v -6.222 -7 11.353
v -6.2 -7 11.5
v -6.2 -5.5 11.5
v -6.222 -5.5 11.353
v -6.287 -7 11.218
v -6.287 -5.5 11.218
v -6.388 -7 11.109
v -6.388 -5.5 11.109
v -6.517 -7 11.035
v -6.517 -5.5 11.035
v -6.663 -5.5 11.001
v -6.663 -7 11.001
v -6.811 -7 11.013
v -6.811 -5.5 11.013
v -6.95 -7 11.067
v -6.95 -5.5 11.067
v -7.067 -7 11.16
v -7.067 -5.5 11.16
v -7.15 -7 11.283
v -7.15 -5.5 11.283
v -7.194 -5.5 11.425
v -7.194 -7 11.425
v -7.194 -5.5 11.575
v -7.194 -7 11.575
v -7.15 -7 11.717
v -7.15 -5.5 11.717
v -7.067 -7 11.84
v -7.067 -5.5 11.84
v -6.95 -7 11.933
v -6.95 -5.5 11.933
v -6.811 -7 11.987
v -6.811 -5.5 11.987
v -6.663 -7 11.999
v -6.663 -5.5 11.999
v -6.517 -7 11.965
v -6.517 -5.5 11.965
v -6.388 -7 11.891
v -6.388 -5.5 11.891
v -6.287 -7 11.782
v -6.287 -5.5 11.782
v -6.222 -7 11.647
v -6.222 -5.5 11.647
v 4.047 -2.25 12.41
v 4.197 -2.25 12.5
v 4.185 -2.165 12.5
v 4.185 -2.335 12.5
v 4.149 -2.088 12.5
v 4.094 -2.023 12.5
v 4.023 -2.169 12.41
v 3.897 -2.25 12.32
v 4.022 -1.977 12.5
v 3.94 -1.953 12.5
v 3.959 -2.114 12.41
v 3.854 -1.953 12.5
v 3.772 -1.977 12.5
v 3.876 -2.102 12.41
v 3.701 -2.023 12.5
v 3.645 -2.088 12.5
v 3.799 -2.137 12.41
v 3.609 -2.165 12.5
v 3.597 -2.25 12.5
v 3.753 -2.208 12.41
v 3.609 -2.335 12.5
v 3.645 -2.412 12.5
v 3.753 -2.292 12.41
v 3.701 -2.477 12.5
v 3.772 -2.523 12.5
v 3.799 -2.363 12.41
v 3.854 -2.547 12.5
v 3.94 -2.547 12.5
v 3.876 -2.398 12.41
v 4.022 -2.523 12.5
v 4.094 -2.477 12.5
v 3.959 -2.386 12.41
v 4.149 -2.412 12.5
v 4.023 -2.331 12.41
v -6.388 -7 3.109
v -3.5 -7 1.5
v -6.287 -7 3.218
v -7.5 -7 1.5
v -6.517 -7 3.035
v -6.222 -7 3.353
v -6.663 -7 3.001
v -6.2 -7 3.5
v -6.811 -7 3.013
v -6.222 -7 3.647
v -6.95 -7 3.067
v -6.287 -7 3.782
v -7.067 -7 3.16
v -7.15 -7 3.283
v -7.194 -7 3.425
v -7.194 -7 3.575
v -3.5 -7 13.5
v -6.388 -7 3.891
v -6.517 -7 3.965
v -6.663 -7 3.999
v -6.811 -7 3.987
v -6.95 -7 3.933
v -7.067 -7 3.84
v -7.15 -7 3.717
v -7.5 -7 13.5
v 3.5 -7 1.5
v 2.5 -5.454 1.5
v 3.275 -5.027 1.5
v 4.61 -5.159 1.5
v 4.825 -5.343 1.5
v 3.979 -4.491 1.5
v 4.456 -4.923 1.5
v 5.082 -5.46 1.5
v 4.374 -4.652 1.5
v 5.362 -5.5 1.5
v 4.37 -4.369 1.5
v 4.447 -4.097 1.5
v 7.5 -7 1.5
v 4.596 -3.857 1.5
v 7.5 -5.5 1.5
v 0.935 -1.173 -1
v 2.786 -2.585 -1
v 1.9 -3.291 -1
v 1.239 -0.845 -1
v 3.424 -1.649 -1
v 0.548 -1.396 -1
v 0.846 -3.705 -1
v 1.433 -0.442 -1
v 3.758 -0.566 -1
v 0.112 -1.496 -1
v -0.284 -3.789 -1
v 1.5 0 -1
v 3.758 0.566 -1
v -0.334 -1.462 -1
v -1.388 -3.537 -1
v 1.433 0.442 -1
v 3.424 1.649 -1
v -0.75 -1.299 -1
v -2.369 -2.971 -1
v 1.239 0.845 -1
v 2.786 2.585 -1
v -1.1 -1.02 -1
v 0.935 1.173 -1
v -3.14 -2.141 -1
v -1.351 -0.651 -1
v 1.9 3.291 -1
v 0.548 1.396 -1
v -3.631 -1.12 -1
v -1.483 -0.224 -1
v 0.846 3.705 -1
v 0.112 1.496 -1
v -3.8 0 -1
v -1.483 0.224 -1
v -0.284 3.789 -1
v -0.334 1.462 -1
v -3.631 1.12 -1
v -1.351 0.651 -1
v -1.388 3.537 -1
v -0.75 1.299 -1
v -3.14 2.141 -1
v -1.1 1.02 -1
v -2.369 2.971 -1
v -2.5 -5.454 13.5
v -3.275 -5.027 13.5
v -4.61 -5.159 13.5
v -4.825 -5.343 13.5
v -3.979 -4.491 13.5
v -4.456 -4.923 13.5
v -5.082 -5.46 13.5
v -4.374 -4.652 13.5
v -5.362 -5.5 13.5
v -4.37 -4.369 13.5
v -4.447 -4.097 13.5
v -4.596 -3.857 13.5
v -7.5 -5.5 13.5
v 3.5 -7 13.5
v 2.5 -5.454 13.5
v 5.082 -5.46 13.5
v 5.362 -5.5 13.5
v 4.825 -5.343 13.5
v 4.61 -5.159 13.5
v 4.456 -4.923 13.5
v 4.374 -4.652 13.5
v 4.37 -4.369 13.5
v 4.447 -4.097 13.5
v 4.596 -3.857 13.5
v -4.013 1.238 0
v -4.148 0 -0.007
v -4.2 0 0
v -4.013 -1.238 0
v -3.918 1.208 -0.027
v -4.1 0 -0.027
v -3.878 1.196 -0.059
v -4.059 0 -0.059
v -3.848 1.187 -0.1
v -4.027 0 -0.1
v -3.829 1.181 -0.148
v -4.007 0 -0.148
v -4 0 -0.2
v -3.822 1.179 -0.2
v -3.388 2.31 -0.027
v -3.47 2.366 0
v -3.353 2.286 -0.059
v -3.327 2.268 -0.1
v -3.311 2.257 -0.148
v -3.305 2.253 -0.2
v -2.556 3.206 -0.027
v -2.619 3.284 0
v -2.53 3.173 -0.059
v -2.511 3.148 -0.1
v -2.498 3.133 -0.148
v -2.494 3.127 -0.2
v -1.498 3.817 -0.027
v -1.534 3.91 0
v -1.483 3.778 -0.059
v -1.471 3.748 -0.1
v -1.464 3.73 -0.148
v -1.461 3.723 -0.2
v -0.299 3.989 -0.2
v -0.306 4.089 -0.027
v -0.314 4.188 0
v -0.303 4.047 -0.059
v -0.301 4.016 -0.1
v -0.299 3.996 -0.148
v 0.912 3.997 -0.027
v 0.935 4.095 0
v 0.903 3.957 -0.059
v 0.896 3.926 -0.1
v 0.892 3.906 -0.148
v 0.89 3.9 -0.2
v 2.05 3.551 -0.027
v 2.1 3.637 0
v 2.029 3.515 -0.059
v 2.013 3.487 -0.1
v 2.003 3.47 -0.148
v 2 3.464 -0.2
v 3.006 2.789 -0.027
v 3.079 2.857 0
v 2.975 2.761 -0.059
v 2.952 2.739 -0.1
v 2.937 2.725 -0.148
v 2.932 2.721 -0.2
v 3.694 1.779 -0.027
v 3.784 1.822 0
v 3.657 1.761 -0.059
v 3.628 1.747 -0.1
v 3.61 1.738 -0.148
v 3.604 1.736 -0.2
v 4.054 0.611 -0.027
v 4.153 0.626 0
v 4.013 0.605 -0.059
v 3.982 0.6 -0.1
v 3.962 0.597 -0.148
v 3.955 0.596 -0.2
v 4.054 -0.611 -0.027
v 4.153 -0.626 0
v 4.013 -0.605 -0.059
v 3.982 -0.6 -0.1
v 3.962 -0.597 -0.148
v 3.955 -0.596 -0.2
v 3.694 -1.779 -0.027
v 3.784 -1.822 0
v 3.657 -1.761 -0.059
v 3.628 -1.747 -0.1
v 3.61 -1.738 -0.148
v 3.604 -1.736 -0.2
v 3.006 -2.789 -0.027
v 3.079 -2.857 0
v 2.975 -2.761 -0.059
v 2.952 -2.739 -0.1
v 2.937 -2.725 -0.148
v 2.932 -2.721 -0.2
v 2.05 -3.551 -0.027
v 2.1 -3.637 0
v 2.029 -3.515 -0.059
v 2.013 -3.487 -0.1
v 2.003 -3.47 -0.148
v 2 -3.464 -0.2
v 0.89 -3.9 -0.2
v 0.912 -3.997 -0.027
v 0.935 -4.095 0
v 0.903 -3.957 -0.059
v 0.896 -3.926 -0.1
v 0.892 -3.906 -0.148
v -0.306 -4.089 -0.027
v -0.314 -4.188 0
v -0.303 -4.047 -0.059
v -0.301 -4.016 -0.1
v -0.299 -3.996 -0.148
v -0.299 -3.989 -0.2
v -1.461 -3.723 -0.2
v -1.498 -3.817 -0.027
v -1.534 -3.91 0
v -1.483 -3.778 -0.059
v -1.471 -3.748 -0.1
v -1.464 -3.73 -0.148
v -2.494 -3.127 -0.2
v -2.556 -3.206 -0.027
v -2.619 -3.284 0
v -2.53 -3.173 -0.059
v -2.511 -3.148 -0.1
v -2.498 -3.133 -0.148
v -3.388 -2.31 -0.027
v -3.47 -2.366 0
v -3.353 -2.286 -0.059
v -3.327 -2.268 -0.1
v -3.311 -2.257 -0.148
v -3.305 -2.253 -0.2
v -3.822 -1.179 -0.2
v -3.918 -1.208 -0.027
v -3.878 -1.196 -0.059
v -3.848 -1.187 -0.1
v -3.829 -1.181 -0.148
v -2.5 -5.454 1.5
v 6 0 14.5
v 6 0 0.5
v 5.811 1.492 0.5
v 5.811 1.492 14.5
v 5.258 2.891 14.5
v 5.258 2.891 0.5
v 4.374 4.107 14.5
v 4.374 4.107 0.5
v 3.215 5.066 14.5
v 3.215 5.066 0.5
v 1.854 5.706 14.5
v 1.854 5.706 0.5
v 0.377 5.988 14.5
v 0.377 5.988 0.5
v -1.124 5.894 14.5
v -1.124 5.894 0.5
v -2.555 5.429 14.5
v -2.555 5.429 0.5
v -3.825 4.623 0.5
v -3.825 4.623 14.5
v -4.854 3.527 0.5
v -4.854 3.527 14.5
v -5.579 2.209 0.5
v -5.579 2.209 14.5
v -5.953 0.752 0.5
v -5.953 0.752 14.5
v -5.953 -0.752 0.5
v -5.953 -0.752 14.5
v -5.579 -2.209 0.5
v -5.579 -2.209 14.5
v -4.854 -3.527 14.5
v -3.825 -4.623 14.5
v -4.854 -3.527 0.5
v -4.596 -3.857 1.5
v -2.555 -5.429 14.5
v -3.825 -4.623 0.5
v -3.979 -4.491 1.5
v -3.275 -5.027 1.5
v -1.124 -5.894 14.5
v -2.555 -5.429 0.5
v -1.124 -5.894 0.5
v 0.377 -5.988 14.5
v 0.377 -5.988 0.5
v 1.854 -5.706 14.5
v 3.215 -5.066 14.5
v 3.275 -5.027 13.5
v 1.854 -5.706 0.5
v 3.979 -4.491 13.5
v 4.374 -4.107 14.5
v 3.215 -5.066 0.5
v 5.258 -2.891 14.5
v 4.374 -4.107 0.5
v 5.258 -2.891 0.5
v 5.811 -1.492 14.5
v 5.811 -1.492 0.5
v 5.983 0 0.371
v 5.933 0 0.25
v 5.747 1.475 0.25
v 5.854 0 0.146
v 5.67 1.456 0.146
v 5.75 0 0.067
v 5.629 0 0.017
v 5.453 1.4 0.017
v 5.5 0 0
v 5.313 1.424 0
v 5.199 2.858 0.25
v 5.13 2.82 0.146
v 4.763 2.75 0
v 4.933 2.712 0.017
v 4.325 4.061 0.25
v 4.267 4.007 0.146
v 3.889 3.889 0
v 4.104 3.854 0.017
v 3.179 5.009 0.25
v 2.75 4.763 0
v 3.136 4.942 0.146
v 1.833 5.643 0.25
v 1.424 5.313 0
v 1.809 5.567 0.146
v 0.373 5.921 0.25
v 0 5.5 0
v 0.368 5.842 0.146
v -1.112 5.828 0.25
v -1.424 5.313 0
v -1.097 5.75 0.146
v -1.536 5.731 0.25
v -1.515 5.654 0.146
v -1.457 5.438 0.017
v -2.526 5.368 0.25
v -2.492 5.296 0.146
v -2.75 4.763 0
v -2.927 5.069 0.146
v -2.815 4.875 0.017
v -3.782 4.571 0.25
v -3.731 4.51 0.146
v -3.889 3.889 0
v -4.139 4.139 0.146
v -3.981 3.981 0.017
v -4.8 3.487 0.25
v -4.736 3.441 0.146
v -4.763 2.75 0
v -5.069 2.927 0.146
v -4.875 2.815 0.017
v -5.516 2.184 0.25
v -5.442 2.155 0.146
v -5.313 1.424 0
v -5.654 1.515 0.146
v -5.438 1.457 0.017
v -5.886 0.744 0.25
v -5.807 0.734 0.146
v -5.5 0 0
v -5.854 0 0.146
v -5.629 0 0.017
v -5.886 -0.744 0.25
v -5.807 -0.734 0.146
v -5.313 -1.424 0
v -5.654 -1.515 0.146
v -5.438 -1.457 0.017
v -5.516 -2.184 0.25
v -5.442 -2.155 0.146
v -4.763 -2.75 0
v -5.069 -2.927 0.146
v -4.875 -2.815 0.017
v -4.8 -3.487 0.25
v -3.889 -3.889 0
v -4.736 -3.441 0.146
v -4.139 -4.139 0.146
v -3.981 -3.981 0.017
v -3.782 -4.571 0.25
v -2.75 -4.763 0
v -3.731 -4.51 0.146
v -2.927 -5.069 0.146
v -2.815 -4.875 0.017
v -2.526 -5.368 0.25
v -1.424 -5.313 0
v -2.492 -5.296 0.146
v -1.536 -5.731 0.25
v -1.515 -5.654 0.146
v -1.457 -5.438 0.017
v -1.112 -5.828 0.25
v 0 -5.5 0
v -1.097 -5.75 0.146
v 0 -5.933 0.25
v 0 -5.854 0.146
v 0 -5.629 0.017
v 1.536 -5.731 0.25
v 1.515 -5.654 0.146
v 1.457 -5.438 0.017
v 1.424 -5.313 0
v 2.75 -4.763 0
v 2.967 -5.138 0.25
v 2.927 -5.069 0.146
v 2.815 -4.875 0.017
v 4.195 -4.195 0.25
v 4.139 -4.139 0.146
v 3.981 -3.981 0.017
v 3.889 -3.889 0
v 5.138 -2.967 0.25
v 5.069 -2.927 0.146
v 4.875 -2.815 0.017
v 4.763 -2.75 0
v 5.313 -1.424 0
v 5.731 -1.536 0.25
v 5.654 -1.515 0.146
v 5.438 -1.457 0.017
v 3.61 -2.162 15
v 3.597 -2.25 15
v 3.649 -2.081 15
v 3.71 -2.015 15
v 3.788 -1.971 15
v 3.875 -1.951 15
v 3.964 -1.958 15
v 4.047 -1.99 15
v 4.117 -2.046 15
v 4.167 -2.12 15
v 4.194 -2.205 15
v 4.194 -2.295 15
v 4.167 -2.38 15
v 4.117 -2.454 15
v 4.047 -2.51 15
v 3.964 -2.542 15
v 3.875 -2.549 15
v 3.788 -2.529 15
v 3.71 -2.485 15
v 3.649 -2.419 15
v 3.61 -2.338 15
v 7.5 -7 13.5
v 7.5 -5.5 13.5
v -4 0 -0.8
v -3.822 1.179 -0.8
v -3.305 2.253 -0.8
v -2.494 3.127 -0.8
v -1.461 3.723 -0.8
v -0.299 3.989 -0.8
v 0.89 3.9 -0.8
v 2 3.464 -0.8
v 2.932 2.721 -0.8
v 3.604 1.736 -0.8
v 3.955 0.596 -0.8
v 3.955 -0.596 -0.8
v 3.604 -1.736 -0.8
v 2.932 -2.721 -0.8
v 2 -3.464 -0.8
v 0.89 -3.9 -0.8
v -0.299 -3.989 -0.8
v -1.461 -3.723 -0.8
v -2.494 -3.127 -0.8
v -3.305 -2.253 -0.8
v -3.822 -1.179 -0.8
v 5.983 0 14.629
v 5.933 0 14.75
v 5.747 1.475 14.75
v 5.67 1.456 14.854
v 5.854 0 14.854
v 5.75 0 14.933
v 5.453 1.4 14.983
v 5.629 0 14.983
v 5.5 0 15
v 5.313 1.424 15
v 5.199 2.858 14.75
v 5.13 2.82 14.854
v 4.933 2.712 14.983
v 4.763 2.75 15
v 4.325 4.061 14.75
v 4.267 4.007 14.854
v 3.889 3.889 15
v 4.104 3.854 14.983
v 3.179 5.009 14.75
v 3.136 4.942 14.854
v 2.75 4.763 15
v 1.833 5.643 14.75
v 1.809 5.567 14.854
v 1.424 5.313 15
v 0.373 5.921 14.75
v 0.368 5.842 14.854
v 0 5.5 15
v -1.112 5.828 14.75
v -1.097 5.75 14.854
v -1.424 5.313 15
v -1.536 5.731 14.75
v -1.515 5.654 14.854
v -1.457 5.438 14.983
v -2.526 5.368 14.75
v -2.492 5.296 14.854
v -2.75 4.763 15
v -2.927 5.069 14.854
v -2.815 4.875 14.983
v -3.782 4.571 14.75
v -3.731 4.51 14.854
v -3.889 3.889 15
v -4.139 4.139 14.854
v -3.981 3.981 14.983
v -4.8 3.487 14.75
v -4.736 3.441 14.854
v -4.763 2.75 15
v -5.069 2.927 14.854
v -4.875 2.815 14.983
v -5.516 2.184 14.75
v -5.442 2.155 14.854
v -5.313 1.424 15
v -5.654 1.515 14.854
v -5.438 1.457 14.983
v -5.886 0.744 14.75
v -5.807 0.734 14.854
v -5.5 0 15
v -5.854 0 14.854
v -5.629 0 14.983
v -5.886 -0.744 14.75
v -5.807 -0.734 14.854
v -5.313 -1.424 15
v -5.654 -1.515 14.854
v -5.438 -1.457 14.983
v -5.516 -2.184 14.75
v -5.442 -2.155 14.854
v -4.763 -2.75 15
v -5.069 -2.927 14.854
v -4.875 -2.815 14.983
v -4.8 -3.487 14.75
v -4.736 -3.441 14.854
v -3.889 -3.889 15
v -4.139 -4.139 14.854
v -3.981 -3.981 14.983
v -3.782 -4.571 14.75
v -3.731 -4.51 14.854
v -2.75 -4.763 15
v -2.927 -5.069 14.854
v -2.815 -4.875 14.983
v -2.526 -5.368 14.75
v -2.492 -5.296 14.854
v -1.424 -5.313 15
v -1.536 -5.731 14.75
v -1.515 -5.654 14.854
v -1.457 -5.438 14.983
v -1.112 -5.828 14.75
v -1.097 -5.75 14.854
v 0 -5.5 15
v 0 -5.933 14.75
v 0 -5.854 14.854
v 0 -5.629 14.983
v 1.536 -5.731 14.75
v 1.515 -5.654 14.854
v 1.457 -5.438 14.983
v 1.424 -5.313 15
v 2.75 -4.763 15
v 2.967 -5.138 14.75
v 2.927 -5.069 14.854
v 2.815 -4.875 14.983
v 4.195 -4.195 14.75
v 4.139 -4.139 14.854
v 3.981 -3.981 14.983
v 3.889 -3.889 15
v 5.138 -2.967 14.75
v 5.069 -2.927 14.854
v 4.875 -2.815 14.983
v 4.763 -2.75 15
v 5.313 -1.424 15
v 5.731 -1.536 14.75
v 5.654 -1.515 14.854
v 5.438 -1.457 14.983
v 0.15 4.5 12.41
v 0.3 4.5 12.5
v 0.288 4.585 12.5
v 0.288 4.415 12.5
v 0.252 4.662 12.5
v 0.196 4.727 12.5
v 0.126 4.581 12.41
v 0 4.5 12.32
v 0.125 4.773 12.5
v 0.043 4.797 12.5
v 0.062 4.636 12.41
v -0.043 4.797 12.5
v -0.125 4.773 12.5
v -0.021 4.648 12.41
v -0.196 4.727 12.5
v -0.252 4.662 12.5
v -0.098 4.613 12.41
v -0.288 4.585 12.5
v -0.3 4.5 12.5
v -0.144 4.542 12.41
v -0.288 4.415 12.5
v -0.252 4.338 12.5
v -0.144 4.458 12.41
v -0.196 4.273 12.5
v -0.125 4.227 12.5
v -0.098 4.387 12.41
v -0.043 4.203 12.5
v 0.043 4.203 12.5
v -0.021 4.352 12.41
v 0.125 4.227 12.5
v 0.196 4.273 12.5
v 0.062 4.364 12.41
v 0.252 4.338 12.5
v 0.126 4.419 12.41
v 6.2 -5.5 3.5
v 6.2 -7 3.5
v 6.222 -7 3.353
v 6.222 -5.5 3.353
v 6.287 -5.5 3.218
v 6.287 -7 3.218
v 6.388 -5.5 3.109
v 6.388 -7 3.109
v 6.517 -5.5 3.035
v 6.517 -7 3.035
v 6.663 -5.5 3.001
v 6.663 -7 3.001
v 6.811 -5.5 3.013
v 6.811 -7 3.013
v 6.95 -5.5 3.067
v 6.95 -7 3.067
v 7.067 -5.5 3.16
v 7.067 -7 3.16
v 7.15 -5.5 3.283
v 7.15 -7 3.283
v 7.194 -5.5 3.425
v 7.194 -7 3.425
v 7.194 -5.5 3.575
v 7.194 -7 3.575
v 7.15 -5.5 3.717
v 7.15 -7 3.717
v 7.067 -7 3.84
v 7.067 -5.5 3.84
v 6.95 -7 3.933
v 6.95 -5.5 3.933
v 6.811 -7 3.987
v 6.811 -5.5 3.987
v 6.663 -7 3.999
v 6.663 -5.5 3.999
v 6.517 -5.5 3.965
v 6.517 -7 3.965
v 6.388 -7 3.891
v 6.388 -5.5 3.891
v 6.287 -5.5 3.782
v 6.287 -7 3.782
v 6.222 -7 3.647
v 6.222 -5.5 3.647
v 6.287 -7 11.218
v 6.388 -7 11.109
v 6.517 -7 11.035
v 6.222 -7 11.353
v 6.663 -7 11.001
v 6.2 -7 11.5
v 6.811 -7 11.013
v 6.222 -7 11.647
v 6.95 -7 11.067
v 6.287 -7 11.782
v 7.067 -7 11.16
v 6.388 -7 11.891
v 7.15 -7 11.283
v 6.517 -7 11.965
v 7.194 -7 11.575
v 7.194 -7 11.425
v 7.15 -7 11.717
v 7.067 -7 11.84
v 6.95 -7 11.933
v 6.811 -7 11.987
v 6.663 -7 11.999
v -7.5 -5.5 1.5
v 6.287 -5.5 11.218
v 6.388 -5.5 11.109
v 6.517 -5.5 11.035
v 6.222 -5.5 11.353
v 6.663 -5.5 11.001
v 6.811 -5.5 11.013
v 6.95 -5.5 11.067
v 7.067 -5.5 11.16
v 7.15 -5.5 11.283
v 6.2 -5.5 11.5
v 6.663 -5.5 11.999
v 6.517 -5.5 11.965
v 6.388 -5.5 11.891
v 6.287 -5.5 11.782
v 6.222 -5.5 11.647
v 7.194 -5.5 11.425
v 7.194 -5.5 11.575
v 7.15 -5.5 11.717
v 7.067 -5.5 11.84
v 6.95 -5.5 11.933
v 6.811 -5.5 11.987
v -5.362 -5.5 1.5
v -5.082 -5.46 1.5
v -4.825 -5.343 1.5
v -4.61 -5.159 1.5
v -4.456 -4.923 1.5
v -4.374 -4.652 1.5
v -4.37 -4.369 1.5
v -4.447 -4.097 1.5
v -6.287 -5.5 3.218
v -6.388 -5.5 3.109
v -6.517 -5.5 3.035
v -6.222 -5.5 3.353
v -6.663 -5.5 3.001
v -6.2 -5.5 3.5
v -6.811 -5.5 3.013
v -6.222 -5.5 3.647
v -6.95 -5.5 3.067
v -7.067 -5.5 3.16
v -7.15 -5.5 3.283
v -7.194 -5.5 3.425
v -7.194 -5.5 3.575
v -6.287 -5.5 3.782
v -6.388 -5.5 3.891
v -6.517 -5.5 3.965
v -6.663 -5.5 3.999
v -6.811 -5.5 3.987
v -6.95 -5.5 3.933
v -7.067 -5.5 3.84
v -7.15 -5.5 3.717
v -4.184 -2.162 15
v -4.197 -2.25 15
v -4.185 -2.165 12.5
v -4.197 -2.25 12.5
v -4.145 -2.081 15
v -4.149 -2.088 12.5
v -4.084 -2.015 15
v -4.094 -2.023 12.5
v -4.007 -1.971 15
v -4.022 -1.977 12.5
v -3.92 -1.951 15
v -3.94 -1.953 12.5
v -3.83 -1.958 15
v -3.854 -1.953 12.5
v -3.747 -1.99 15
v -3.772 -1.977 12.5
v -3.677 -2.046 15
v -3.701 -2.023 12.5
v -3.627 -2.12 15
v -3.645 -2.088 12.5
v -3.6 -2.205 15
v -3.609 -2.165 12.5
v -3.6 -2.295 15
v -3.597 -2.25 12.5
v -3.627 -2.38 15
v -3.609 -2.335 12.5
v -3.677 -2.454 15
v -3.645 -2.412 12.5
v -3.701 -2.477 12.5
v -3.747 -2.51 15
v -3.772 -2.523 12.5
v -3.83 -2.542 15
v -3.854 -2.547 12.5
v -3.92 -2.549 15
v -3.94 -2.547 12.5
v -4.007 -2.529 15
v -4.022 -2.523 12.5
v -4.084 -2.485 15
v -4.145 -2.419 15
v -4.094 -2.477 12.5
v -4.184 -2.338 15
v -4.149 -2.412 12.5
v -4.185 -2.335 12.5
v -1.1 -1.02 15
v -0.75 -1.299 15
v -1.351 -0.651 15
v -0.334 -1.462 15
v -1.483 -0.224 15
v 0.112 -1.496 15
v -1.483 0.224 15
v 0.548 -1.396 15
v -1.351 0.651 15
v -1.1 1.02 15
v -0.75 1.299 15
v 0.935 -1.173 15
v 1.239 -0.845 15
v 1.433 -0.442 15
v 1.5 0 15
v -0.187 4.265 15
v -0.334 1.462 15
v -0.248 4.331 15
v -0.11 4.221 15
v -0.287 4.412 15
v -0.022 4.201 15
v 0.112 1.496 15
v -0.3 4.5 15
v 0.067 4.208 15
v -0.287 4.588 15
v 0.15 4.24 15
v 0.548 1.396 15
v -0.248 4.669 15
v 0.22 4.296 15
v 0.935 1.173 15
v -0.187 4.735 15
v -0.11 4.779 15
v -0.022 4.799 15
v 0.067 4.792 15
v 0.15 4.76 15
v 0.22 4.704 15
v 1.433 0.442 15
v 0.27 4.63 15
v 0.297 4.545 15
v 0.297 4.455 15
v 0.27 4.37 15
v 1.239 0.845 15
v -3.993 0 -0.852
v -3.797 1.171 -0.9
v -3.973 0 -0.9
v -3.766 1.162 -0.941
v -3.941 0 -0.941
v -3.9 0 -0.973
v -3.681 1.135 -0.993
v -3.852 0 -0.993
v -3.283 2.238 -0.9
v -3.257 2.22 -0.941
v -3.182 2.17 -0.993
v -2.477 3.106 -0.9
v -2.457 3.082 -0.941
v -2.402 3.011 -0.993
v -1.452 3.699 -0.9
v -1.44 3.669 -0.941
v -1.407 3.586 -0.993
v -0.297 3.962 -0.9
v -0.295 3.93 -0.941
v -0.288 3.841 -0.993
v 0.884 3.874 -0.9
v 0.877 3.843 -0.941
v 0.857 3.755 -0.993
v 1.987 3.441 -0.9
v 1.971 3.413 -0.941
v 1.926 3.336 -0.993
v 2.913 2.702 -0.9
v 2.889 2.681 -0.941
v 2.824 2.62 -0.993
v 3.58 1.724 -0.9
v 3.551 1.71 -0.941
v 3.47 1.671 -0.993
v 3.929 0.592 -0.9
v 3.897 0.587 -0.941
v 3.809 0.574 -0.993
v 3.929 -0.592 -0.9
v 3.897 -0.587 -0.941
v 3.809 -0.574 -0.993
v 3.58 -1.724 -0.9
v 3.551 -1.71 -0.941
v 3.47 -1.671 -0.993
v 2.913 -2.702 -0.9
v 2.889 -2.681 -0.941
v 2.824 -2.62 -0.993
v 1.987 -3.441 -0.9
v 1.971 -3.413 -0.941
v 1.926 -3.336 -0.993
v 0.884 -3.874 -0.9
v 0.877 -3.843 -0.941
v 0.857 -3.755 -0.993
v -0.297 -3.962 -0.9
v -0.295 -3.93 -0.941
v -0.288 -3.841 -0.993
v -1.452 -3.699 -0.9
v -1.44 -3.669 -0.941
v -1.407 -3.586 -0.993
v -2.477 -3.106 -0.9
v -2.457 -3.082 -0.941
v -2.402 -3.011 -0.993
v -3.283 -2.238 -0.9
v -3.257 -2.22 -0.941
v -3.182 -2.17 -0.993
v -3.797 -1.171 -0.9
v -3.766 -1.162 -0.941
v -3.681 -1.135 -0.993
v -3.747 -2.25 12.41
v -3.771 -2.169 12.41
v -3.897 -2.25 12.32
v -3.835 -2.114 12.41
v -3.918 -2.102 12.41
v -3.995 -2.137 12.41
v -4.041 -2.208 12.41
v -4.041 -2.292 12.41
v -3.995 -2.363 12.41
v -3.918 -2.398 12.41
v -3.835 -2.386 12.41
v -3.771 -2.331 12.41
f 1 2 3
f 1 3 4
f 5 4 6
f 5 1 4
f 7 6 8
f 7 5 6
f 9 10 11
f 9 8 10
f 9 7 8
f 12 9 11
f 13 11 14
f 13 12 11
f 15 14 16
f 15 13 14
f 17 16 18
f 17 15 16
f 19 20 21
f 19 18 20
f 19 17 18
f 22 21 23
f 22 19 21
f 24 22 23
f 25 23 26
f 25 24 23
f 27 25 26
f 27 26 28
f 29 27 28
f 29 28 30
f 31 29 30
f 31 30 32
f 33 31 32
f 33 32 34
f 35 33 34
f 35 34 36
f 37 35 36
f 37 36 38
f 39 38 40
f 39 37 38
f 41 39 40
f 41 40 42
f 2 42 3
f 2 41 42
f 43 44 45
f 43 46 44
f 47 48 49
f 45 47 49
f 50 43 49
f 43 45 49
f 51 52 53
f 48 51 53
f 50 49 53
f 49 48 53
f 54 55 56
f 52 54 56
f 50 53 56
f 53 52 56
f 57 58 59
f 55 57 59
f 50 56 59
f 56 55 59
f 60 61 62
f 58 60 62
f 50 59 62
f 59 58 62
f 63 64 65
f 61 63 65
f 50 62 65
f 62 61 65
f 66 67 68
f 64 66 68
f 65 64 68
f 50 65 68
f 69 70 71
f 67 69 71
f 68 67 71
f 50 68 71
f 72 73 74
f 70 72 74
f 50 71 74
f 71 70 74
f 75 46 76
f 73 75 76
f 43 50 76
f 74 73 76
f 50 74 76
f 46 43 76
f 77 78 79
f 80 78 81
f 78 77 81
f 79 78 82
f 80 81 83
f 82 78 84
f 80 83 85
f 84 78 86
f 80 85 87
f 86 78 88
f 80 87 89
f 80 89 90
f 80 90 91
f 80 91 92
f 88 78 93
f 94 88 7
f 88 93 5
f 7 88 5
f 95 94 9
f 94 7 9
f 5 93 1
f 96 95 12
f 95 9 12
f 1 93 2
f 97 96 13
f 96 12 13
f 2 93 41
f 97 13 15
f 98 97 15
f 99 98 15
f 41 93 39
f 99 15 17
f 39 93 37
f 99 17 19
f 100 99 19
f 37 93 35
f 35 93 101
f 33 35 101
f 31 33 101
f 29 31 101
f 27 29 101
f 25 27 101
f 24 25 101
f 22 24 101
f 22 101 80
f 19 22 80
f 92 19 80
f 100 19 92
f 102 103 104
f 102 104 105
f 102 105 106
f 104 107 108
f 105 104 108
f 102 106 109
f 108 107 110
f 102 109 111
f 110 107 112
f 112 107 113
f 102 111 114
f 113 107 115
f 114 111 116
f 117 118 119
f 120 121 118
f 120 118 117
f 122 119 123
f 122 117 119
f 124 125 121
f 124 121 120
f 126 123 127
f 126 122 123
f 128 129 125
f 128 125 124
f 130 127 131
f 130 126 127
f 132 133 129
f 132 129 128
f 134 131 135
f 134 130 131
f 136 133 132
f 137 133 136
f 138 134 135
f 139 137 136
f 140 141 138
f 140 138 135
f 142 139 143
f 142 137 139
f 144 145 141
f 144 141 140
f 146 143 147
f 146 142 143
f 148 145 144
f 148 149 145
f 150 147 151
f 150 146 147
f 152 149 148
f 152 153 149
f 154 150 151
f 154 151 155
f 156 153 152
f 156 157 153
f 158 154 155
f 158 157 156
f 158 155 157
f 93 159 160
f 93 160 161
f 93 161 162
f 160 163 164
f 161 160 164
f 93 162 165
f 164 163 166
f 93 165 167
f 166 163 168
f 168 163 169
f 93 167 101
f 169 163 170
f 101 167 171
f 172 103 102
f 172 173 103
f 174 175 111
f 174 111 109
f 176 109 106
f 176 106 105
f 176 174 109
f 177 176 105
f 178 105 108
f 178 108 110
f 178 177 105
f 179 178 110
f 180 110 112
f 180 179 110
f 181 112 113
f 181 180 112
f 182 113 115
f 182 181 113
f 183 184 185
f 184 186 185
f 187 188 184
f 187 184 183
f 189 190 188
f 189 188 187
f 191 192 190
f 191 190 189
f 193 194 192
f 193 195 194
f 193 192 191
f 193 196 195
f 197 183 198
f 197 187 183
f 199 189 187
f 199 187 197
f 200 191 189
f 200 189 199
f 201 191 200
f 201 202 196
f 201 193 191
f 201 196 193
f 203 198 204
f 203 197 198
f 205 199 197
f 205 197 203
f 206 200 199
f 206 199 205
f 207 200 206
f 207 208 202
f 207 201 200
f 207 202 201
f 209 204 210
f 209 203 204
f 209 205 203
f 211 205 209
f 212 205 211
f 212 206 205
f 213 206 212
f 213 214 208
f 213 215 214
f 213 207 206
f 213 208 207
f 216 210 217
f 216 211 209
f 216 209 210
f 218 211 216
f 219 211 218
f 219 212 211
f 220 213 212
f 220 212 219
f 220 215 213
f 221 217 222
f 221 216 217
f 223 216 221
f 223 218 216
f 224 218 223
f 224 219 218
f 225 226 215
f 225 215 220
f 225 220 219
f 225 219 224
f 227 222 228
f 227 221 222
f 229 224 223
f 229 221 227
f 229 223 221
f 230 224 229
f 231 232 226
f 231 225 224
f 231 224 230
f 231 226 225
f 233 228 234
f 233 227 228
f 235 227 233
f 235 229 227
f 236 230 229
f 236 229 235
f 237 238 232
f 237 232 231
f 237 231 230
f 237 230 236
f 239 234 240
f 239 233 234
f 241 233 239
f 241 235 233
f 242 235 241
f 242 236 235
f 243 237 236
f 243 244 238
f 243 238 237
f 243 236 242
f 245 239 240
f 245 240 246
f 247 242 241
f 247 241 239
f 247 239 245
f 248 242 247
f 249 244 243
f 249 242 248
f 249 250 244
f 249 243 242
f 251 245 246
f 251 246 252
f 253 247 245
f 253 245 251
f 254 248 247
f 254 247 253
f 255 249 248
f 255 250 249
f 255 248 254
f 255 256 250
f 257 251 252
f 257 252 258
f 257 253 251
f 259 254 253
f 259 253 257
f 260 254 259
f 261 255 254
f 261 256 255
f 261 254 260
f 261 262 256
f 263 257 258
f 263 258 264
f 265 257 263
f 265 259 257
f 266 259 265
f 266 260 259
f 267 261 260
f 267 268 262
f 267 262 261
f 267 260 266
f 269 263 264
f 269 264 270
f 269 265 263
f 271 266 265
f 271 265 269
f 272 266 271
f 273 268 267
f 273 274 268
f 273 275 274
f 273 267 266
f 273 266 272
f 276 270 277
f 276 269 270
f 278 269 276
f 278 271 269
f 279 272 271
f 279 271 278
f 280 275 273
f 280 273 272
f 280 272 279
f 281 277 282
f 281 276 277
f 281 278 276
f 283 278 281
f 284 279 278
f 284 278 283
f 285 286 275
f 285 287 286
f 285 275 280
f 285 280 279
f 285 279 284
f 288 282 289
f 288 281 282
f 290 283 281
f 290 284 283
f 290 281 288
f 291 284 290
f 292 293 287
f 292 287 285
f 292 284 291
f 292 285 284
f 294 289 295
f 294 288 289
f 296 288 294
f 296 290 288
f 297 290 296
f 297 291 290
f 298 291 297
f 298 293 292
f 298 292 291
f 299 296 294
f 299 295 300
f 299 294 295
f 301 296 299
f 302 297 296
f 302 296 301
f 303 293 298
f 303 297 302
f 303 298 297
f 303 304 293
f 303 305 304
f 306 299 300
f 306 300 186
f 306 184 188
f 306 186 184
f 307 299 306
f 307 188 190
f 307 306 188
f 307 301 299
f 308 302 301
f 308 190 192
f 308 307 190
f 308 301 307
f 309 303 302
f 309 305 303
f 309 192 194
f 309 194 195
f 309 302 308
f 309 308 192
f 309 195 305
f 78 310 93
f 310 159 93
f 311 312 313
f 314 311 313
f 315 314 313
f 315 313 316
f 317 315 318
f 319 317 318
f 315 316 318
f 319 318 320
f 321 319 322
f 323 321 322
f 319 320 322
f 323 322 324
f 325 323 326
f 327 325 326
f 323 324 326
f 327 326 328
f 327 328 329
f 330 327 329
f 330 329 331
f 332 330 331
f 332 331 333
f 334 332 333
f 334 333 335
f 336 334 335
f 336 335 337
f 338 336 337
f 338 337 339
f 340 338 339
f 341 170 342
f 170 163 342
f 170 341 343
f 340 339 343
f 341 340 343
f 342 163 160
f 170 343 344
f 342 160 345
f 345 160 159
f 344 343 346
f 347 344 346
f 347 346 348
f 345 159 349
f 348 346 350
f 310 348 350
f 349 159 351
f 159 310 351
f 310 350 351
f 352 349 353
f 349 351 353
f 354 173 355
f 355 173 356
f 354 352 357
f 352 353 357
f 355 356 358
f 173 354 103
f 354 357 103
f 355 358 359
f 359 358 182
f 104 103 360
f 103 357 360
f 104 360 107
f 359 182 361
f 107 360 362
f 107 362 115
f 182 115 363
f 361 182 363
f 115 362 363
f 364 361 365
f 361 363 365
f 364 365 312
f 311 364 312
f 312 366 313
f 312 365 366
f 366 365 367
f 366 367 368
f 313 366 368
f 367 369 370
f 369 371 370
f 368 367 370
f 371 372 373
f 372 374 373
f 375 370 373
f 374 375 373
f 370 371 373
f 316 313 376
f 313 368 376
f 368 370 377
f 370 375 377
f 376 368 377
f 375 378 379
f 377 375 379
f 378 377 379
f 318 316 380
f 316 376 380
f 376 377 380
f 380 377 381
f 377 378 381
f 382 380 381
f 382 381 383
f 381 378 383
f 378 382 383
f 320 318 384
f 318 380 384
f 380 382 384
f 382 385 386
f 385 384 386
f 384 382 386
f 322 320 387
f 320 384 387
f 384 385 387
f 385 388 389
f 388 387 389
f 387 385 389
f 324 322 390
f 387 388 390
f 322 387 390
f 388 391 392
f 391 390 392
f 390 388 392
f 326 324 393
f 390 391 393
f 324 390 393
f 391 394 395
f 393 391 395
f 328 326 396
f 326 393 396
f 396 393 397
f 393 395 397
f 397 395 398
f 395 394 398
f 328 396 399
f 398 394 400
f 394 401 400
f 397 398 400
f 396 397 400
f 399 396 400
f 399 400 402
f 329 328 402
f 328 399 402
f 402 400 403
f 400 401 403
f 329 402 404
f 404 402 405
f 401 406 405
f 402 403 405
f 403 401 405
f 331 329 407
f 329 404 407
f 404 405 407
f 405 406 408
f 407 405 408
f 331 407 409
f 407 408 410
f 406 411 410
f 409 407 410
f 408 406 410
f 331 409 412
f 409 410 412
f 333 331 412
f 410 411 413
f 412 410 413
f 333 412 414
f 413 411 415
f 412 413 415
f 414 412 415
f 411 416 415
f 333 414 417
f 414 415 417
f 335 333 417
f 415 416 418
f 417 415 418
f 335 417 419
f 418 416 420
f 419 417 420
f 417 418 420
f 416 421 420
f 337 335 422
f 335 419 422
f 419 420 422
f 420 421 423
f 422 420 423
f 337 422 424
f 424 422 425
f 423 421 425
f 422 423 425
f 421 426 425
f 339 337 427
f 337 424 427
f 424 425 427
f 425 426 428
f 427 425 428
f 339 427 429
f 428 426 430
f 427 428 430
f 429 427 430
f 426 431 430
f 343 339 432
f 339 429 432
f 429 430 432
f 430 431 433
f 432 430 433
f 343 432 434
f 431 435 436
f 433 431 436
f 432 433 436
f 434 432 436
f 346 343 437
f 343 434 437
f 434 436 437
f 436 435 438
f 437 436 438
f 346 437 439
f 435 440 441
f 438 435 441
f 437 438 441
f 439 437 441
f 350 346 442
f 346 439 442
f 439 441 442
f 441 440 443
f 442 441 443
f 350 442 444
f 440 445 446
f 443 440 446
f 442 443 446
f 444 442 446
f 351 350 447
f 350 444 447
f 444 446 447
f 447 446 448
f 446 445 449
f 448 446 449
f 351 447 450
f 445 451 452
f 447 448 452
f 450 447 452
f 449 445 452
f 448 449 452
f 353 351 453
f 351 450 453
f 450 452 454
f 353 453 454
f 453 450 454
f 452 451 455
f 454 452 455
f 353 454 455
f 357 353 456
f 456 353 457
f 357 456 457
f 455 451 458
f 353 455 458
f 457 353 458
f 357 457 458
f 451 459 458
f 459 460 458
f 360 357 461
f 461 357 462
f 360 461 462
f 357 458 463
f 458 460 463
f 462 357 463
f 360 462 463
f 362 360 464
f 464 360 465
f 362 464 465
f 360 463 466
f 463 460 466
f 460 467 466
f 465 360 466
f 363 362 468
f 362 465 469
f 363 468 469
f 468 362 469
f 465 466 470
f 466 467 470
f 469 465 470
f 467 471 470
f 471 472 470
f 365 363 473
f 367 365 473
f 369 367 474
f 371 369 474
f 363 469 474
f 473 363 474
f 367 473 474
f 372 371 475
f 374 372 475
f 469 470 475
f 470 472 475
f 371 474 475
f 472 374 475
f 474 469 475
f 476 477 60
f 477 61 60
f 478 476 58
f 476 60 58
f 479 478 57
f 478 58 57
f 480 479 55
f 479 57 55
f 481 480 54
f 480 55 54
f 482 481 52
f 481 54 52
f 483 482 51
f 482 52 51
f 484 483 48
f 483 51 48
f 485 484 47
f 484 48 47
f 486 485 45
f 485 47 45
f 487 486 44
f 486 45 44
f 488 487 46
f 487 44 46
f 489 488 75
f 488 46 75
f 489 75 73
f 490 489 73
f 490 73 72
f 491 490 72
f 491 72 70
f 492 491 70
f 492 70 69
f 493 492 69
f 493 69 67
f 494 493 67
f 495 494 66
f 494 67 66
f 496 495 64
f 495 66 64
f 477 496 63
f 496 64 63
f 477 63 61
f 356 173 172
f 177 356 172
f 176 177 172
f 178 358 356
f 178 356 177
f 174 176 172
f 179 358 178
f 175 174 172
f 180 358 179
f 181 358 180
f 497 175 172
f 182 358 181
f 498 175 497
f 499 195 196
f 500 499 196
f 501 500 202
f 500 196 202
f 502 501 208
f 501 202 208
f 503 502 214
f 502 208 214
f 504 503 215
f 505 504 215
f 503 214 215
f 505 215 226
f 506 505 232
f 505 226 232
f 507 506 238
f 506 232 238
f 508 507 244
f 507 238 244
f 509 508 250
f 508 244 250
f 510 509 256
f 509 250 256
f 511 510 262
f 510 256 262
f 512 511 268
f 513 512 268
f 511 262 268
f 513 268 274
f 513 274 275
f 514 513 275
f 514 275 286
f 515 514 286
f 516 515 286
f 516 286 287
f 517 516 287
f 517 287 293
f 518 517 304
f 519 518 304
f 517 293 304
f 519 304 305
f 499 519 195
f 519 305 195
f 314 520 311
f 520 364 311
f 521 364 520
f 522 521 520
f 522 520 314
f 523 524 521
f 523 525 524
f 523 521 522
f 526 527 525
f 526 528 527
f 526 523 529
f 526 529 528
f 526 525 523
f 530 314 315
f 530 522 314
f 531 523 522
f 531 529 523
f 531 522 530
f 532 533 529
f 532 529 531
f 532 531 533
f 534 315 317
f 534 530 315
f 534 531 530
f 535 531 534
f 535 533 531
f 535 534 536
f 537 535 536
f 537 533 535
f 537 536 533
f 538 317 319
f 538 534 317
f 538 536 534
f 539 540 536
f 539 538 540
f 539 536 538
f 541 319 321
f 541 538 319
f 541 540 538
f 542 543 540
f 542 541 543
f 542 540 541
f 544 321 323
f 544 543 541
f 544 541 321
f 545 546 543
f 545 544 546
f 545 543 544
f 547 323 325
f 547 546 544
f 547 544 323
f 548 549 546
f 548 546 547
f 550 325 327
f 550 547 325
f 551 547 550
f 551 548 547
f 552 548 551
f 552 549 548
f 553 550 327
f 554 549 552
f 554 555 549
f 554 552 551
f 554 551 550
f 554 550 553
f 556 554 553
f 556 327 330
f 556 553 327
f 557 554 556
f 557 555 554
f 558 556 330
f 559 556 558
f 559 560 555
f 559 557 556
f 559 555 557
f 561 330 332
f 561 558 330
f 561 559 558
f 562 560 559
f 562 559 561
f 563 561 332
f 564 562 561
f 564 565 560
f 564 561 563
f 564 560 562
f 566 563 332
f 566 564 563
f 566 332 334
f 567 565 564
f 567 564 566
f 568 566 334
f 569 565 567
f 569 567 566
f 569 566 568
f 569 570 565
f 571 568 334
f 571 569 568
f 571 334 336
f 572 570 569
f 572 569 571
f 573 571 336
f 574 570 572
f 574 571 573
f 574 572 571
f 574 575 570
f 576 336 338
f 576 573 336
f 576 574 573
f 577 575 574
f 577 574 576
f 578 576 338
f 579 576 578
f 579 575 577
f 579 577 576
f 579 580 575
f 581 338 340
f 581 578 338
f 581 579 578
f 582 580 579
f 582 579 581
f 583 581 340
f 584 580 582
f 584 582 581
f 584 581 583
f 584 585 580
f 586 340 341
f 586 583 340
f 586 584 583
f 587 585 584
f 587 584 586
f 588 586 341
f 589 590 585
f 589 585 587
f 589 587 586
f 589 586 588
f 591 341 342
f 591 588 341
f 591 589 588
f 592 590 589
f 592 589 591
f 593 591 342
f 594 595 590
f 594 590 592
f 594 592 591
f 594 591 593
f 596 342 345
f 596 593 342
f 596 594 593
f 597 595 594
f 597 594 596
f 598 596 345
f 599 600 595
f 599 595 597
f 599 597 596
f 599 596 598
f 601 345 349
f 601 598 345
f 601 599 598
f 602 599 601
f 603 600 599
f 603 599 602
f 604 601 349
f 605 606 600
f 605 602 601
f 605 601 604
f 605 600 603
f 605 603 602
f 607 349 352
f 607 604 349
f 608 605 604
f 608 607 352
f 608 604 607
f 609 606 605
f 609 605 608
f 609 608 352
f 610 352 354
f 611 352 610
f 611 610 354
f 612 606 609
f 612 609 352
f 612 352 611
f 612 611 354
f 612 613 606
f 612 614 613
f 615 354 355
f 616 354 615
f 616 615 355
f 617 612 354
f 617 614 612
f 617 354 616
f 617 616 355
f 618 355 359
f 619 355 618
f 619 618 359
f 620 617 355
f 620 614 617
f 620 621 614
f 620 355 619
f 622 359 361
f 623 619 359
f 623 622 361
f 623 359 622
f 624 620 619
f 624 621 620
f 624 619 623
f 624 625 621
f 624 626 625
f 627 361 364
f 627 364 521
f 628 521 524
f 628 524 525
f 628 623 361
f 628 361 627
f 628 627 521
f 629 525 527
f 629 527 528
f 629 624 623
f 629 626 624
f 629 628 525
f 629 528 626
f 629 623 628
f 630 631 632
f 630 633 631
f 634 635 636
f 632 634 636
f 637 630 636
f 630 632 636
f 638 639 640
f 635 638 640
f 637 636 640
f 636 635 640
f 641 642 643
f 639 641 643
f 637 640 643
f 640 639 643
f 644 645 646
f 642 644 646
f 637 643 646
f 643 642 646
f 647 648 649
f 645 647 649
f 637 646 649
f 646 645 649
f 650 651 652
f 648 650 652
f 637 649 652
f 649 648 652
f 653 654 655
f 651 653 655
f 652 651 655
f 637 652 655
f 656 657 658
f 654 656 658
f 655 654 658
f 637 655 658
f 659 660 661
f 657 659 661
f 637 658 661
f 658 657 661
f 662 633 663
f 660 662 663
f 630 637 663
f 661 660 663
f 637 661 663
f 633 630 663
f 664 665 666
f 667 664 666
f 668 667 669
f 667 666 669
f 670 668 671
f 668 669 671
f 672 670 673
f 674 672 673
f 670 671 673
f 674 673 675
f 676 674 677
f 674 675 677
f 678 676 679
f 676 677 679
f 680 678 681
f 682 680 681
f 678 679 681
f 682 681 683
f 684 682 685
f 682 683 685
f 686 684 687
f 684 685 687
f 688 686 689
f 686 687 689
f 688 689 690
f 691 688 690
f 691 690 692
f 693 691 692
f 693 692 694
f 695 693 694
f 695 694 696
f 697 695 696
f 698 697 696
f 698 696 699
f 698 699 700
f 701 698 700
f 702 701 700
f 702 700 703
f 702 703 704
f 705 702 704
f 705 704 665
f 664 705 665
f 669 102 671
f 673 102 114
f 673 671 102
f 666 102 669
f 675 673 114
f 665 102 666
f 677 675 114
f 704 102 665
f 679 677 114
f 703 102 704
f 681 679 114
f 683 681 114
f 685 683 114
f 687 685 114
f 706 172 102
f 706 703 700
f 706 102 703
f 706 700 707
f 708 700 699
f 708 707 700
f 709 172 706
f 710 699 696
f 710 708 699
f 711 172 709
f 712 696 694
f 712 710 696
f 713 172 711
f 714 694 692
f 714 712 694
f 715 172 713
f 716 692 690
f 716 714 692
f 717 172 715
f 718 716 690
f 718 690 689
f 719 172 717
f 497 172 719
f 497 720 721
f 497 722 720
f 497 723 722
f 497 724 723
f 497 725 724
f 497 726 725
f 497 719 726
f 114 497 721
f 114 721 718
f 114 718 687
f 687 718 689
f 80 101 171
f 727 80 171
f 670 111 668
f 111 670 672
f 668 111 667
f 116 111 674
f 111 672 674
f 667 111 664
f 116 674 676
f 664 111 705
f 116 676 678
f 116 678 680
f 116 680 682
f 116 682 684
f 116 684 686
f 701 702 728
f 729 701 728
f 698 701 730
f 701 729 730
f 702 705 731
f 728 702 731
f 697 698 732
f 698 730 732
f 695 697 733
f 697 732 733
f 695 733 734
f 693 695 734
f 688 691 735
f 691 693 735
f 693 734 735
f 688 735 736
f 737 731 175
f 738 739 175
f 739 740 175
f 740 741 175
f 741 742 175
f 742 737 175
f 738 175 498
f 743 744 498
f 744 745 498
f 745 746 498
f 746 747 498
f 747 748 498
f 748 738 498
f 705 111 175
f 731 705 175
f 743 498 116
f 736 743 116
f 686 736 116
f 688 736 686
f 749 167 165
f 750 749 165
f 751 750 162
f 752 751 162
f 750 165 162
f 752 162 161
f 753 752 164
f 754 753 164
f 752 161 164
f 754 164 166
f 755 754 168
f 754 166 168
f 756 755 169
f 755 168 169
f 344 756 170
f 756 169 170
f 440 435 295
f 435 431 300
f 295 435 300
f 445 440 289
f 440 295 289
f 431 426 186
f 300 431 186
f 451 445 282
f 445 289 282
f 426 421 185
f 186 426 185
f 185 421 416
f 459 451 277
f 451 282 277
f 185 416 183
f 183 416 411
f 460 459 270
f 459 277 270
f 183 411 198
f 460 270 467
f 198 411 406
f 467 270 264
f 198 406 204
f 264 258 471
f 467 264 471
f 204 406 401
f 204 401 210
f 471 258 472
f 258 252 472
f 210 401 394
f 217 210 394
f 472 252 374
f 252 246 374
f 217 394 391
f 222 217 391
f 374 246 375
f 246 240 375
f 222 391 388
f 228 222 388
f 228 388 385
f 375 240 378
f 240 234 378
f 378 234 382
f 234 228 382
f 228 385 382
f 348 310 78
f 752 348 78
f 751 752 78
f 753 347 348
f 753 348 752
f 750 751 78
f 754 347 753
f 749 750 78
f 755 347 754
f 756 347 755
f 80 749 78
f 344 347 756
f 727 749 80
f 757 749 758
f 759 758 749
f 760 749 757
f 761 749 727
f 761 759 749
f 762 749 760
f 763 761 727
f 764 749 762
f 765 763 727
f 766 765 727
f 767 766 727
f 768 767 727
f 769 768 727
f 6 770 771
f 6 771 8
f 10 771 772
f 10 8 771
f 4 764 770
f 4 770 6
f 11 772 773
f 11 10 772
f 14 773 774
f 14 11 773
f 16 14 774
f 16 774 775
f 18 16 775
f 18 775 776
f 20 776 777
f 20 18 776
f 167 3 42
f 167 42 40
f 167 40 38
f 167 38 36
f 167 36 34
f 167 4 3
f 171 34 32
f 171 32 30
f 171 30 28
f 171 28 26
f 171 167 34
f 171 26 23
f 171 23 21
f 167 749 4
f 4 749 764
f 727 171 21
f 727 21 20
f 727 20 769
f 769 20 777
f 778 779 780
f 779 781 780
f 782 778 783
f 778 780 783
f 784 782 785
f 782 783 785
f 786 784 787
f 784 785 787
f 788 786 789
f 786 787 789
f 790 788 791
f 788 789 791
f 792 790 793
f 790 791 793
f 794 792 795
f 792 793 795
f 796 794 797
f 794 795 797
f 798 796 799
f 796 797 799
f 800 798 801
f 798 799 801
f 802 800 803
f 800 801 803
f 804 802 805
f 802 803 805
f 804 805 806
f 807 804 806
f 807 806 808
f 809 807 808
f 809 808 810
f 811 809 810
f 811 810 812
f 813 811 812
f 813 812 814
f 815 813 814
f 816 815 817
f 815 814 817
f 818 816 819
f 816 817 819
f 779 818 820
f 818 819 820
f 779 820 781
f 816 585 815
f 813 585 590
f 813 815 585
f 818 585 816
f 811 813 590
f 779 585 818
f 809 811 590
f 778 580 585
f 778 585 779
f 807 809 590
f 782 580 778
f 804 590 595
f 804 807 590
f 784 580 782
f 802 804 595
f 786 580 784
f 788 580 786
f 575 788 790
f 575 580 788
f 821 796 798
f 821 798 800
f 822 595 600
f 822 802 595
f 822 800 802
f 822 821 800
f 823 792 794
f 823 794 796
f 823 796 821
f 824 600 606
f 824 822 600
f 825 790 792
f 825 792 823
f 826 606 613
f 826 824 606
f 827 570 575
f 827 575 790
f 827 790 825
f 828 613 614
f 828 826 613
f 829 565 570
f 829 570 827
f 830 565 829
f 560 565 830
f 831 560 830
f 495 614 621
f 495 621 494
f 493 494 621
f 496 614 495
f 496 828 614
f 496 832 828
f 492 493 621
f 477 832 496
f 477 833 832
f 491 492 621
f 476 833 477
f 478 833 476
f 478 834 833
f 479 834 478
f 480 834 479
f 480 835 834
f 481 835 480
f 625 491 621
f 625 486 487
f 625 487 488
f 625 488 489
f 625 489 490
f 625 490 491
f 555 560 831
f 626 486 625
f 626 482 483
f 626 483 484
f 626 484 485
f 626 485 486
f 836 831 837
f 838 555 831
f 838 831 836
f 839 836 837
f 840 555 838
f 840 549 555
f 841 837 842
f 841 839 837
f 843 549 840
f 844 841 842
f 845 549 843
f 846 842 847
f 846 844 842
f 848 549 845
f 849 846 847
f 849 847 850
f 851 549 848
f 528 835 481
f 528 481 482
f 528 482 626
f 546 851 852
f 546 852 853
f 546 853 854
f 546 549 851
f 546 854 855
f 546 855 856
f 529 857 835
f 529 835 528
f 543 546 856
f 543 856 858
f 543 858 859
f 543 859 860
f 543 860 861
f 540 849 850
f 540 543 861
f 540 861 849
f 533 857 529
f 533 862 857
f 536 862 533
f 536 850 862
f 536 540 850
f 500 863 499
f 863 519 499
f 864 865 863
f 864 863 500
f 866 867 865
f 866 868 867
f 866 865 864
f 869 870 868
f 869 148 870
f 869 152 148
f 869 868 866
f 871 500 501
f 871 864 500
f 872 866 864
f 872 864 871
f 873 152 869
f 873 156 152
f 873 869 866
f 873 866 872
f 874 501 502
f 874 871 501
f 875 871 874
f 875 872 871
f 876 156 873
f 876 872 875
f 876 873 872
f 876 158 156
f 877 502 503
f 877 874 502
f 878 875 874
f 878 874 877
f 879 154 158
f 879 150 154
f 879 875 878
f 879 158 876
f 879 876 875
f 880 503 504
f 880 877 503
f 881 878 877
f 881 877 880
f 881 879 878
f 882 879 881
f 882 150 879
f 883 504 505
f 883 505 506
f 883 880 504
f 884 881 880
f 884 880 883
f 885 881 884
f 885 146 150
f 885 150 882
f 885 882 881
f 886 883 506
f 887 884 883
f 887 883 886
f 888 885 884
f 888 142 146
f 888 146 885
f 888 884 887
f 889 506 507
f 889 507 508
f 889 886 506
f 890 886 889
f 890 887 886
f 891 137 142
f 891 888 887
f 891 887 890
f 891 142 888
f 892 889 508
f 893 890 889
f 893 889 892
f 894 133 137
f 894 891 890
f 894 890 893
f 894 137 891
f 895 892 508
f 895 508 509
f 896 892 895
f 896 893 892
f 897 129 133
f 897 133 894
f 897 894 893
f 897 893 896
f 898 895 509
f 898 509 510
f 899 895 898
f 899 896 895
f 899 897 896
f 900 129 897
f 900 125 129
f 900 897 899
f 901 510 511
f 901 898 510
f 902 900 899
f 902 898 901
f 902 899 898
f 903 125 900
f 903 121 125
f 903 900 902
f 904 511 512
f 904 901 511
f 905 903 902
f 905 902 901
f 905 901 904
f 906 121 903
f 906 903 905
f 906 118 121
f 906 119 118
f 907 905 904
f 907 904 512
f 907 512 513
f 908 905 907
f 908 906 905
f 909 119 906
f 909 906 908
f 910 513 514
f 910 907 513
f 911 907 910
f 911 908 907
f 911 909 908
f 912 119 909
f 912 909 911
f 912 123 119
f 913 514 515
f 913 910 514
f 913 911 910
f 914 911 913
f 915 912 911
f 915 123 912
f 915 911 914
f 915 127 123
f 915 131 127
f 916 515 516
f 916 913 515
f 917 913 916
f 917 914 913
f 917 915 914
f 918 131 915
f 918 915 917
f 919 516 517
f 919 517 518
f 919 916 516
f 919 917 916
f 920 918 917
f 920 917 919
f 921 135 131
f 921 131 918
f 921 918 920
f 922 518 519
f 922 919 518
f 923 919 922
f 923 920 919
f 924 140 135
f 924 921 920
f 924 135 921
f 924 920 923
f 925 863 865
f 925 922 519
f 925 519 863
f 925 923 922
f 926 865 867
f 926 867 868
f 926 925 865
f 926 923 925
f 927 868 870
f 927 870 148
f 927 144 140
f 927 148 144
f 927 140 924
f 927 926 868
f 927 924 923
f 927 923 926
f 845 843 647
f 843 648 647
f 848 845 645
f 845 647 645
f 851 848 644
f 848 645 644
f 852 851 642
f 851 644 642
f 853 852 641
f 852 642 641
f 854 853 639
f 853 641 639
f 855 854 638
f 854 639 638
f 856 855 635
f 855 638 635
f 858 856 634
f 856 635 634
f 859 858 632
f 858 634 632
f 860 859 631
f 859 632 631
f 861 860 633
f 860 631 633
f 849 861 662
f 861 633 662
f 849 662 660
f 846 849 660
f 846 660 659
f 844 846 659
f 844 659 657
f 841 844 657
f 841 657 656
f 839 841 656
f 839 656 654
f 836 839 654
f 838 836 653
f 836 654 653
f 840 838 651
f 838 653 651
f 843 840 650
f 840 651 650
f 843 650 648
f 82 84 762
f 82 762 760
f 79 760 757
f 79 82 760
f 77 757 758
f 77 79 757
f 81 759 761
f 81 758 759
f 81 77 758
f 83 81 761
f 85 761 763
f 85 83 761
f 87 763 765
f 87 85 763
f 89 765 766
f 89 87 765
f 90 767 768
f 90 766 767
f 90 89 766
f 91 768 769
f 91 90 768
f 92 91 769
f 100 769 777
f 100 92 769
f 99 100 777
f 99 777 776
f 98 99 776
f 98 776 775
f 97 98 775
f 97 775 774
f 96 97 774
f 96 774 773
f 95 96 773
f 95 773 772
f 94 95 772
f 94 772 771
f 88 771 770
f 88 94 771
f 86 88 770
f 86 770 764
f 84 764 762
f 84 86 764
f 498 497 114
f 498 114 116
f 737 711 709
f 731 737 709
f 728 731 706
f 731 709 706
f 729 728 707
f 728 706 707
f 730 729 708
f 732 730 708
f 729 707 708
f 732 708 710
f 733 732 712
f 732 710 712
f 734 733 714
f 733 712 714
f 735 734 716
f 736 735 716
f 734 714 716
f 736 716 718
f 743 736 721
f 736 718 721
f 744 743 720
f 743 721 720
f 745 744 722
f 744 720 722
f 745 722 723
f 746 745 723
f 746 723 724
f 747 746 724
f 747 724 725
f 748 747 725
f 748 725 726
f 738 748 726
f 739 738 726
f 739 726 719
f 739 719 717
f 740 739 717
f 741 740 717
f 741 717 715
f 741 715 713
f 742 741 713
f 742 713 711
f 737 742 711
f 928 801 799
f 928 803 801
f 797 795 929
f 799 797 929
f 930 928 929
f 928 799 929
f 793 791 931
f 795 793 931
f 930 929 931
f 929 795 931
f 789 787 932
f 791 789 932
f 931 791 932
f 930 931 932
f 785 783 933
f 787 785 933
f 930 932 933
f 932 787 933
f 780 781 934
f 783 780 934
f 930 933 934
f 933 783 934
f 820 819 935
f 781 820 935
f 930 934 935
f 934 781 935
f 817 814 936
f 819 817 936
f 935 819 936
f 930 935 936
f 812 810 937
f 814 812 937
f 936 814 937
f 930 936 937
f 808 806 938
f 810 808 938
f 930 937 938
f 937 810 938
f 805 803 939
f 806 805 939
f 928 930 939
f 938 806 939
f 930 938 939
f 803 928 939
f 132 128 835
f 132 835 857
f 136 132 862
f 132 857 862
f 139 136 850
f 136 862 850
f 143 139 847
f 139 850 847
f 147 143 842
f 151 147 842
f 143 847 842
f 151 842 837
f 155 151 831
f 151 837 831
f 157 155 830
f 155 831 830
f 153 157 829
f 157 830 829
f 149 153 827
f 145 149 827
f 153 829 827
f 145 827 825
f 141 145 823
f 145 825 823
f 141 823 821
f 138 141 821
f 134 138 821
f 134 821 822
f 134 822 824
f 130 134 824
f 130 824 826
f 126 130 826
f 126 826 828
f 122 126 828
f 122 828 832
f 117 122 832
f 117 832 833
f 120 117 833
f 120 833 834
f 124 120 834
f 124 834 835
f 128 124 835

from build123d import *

# Parameters (mm, degrees)
SKETCH_1_R             = 6
EXTRUDE_1_DEPTH        = 15
SKETCH_3_R             = 4
EXTRUDE_3_DEPTH        = 1
FILLET_2_R             = 0.5
EXTRUDE_START          = 7.5
SKETCH_4_W             = 4
SKETCH_4_H             = 1.5
EXTRUDE_4_DEPTH        = 6
F_1_0MM_1_D            = 1
FILLET_3_R             = 0.2
SKETCH_7_R             = 1.5
CUT_EXTRUDE_1_DEPTH    = 20.006577809
HOLE_WIZARD_M2_1_D     = 0.6
HOLE_WIZARD_M2_1_DEPTH = 2.5
HOLE_WIZARD_M2_1_TIP   = 0.180258186


with BuildPart() as part:
    # 草圖1 → 填料-伸長1 (new body)
    with BuildSketch(Plane.XY):
        Circle(SKETCH_1_R)
    extrude(amount=EXTRUDE_1_DEPTH)

    # 草圖3 → 填料-伸長3 (add)
    with BuildSketch(Plane(origin=(0, 0, 0), x_dir=(-1, 0, 0), z_dir=(0, 0, -1))):
        Circle(SKETCH_3_R)
    extrude(amount=EXTRUDE_3_DEPTH)

    # 圓角2
    fillet_2_edges = [part.edges().sort_by_distance(p)[0] for p in [
        (-6, 0, 0),
        (-6, 0, 15),
    ]]
    fillet(fillet_2_edges, radius=FILLET_2_R)

    # 草圖4 → 填料-伸長4 (add, symmetric)
    with BuildSketch(Plane.XY.offset(EXTRUDE_START)):
        with Locations((5.5, -6.25)):
            Rectangle(SKETCH_4_W, SKETCH_4_H)
        with BuildLine():
            Line((2.5, -5.454356057), (3.5, -7))
            Line((3.5, -7), (3.5, -5.5))
            Line((3.5, -5.5), (5.361902647, -5.5))
            ThreePointArc((5.361902647, -5.5), (4.45557568, -4.922577127), (4.595916555, -3.857142857))
            ThreePointArc((4.595916555, -3.857142857), (3.636726611, -4.772234231), (2.5, -5.454356057))
        make_face()
    extrude_4 = extrude(amount=EXTRUDE_4_DEPTH, both=True)

    # Ø1.0mm 定位孔1 (through all)
    with Locations(Plane(origin=(0, -5.5, 0), x_dir=(1, 0, 0), z_dir=(0, 1, 0))):
        with Locations((6.7, -3.5), (6.7, -11.5)):
            f_1_0mm_1 = Hole(F_1_0MM_1_D / 2)

    # 鏡射1: 填料-伸長4, Ø1.0mm 定位孔1 across plane
    add(extrude_4.mirror(Plane(origin=(0, 0, 0), x_dir=(0, 0, 1), z_dir=(1, 0, 0))))
    add(f_1_0mm_1.mirror(Plane(origin=(0, 0, 0), x_dir=(0, 0, 1), z_dir=(1, 0, 0))), mode=Mode.SUBTRACT)

    # 圓角3
    fillet_3_edges = [part.edges().sort_by_distance(p)[0] for p in [
        (4, 0, 0),
        (4, 0, -1),
    ]]
    fillet(fillet_3_edges, radius=FILLET_3_R)

    # 草圖7 → 除料-伸長1 (cut, through all)
    with BuildSketch(Plane.XY.offset(15)):
        Circle(SKETCH_7_R)
    extrude(amount=-CUT_EXTRUDE_1_DEPTH, mode=Mode.SUBTRACT)

    # M2 螺紋孔1
    with Locations(Plane.XY.offset(15)):
        with Locations((0, 4.5), (3.897114317, -2.25), (-3.897114317, -2.25)):
            Hole(HOLE_WIZARD_M2_1_D / 2, depth=HOLE_WIZARD_M2_1_DEPTH)
            with Locations((0, 0, -(HOLE_WIZARD_M2_1_DEPTH + HOLE_WIZARD_M2_1_TIP / 2))):  # 118° drill point
                Cone(0, HOLE_WIZARD_M2_1_D / 2, HOLE_WIZARD_M2_1_TIP, mode=Mode.SUBTRACT)


solid = part.part
